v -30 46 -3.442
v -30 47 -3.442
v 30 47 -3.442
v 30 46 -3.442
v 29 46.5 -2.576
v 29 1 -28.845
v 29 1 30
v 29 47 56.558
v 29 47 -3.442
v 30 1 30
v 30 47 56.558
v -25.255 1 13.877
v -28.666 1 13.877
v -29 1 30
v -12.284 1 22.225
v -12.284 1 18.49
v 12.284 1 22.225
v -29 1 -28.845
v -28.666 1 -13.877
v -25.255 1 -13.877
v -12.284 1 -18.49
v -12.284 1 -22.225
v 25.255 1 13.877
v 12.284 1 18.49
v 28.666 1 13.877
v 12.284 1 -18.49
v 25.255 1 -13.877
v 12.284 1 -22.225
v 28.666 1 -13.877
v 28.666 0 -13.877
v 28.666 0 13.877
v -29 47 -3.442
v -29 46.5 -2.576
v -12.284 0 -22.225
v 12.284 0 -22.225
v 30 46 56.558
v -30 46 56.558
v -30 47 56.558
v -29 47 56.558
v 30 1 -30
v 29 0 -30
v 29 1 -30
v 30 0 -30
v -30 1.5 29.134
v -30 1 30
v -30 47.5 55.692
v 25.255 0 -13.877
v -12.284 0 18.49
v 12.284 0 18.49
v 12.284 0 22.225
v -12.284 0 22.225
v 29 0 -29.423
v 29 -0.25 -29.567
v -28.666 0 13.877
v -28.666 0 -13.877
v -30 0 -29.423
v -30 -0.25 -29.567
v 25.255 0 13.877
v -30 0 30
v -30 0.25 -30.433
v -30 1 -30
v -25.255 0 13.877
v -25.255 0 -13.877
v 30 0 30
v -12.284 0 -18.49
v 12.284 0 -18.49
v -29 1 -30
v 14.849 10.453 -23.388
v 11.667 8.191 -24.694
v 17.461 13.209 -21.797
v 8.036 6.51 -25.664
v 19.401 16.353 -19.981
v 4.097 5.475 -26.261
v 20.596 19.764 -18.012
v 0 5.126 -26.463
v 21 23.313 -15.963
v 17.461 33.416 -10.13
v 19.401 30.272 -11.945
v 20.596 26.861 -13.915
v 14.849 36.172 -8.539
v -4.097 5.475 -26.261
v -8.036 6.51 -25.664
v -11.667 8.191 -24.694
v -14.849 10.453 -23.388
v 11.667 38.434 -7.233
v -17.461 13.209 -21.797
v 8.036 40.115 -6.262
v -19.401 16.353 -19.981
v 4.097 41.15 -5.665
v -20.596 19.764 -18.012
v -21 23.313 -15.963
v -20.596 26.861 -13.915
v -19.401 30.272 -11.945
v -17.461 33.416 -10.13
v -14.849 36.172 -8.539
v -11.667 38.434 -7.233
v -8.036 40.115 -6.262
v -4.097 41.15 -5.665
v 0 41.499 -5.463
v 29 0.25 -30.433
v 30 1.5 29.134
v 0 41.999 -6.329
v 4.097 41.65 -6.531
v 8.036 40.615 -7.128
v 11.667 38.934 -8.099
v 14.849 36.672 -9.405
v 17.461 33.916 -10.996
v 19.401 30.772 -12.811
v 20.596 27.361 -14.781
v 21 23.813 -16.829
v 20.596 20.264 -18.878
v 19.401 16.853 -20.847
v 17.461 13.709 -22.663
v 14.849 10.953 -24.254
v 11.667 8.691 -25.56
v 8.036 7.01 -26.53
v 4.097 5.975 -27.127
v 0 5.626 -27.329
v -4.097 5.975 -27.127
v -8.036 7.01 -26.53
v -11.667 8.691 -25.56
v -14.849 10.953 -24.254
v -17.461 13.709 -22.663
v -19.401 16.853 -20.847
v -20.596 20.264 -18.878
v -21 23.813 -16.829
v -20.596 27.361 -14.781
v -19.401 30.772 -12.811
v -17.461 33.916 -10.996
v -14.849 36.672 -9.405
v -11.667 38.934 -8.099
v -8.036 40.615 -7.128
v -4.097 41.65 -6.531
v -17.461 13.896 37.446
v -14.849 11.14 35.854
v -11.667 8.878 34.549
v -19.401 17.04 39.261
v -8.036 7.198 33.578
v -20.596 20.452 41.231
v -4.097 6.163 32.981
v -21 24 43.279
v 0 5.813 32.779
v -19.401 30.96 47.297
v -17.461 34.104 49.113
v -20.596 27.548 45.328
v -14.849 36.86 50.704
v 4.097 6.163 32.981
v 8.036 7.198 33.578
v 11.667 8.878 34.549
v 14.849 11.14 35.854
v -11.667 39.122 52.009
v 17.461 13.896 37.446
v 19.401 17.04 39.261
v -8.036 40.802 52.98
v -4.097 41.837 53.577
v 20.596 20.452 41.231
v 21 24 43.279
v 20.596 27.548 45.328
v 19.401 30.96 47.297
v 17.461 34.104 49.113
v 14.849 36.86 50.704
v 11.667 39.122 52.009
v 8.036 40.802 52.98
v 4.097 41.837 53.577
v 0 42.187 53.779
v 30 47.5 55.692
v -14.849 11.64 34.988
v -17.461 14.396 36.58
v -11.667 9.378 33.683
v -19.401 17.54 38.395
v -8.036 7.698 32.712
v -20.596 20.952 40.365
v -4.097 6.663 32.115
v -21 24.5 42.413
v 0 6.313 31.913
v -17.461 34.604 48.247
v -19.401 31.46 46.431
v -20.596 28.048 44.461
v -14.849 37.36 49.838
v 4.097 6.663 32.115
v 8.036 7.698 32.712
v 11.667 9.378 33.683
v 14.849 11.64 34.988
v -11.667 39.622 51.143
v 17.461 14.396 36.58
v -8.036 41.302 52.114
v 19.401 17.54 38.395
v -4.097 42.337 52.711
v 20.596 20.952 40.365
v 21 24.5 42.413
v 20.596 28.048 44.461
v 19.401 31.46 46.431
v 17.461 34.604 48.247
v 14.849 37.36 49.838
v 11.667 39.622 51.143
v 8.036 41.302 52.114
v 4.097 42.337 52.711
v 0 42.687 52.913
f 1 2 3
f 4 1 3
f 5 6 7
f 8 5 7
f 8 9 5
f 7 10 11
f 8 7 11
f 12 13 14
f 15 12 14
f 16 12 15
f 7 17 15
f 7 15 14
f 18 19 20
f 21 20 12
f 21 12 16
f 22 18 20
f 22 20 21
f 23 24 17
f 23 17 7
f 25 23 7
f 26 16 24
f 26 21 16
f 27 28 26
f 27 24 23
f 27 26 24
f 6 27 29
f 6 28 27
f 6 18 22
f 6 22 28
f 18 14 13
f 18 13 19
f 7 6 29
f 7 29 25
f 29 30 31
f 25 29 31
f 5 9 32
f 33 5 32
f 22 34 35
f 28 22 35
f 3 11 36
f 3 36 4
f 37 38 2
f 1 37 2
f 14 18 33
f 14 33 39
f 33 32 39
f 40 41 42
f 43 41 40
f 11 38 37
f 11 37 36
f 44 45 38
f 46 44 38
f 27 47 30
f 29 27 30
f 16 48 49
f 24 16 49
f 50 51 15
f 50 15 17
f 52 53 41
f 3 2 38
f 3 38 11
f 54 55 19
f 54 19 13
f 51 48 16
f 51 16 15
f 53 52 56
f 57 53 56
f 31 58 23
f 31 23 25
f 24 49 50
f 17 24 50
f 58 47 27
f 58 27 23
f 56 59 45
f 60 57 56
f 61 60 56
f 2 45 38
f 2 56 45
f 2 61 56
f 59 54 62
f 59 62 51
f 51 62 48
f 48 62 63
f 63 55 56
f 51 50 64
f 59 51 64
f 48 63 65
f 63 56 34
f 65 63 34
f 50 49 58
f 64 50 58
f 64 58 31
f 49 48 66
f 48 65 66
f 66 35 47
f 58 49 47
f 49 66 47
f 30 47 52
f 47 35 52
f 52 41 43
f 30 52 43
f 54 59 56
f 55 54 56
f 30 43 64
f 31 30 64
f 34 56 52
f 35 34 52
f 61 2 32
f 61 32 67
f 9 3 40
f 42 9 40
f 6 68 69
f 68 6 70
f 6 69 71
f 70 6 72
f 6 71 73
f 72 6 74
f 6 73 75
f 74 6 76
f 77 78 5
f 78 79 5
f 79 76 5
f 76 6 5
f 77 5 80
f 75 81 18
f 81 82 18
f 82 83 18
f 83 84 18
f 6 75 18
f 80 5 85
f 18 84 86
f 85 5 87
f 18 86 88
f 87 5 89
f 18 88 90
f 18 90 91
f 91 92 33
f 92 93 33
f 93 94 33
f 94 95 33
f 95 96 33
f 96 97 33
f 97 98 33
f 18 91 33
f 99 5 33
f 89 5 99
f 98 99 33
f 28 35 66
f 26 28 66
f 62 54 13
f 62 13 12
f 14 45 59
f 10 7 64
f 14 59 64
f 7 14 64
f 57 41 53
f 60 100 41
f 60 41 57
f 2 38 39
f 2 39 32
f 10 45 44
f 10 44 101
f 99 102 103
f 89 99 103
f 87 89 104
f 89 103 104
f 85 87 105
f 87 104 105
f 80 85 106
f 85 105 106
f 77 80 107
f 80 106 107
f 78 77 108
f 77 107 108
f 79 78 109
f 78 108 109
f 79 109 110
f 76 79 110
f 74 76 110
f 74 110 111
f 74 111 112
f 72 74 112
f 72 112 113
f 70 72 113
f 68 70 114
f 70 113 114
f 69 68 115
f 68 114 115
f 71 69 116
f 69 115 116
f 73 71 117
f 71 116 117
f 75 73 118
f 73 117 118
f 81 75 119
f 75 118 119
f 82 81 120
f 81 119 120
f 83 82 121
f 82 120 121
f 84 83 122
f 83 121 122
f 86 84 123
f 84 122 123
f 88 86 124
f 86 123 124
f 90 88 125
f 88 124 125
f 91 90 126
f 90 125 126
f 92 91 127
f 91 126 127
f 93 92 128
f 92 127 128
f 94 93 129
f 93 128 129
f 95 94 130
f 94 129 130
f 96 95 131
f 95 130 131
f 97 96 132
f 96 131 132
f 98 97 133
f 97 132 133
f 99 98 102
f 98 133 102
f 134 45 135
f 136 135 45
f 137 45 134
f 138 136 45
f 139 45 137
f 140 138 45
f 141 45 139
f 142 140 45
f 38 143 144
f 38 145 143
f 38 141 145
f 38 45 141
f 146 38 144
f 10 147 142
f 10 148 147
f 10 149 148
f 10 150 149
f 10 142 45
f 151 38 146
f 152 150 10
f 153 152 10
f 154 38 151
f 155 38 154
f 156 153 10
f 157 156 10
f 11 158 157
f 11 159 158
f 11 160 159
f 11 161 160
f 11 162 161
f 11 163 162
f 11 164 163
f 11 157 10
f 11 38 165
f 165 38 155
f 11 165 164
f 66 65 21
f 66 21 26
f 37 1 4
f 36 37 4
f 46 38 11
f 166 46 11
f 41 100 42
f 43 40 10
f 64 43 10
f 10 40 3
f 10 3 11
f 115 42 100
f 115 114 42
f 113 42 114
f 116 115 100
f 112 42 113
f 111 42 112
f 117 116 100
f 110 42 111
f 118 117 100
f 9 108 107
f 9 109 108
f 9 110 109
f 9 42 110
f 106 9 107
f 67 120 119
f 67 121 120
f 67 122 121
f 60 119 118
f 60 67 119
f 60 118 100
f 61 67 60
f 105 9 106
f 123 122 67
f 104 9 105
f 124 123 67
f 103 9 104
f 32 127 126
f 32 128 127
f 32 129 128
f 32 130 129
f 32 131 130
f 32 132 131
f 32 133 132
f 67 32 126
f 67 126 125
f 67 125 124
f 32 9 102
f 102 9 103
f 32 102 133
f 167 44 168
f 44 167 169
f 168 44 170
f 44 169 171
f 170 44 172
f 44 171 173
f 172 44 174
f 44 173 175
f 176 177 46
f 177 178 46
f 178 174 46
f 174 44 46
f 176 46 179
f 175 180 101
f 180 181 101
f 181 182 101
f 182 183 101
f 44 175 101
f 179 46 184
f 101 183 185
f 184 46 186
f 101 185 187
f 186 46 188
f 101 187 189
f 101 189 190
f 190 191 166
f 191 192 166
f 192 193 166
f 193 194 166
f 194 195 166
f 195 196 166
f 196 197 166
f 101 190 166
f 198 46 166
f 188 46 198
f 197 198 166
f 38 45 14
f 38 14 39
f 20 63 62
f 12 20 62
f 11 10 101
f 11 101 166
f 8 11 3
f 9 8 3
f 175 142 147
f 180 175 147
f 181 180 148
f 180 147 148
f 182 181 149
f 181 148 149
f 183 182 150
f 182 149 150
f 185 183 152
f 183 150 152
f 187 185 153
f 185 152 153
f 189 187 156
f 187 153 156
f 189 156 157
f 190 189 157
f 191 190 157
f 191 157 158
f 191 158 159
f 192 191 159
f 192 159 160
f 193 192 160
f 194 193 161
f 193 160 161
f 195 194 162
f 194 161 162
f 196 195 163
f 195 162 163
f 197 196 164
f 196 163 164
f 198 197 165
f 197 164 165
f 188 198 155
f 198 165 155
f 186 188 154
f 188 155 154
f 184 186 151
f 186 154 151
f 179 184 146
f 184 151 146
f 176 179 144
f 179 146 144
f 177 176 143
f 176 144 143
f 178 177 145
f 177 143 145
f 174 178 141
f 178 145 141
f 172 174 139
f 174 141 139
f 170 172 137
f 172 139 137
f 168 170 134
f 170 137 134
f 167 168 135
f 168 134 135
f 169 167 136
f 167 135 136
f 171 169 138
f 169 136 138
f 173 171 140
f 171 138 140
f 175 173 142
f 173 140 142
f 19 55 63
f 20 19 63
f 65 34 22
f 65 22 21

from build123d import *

# Parameters (mm, degrees)
SKETCH1_W           = 60
SKETCH1_H           = 60
BOSS_EXTRUDE1_DEPTH = 1
BOSS_EXTRUDE2_DEPTH = 1
BOSS_EXTRUDE3_DEPTH = 1
SKETCH5_W           = 59
SKETCH5_H           = 53.982250169
BOSS_EXTRUDE4_DEPTH = 1
SKETCH6_W           = 24.567934446
SKETCH6_H           = 3.734541331
SKETCH6_W_2         = 3.411160388
SKETCH6_H_2         = 27.754766174
CUT_EXTRUDE2_DEPTH  = 1
SKETCH9_R           = 21
CUT_EXTRUDE3_DEPTH  = 1
SKETCH13_W          = 60
SKETCH13_H          = 53.116224765
BOSS_EXTRUDE6_DEPTH = 1
SKETCH14_R          = 21
CUT_EXTRUDE4_DEPTH  = 1
SKETCH15_W          = 60
SKETCH15_H          = 60
BOSS_EXTRUDE7_DEPTH = 1


with BuildPart() as part:
    # Sketch1 → Boss-Extrude1 (new body)
    with BuildSketch(Plane(origin=(0, 0, 0), x_dir=(1, 0, 0), z_dir=(0, 1, 0))):
        Rectangle(SKETCH1_W, SKETCH1_H)
    extrude(amount=BOSS_EXTRUDE1_DEPTH)

    # Sketch2 → Boss-Extrude2 (add)
    with BuildSketch(Plane.ZY.offset(30)):
        Polygon((-30, 1), (30, 1), (56.558112383, 47), (-3.441887617, 47), align=None)
    extrude(amount=-BOSS_EXTRUDE2_DEPTH)

    # Sketch3 → Boss-Extrude3 (add)
    with BuildSketch(Plane(origin=(30, 0, 0), x_dir=(0, 0, -1), z_dir=(1, 0, 0))):
        Polygon((30, 1), (-30, 1), (-56.558112383, 47), (3.441887617, 47), align=None)
    extrude(amount=-BOSS_EXTRUDE3_DEPTH)

    # Sketch5 → Boss-Extrude4 (add)
    with BuildSketch(Plane(origin=(0, 13.240381057, -22.933012702), x_dir=(-1, 0, 0), z_dir=(0, 0.500000000000001, -0.8660254037844382))):
        with Locations((0.5, 11.991125085)):
            Rectangle(SKETCH5_W, SKETCH5_H)
    extrude(amount=-BOSS_EXTRUDE4_DEPTH)

    # Sketch6 → Cut-Extrude2 (cut)
    with BuildSketch(Plane.XZ):
        with Locations((0, 20.357331474)):
            Rectangle(SKETCH6_W, SKETCH6_H)
        with Locations((0, -20.357331474)):
            Rectangle(SKETCH6_W, SKETCH6_H)
        with Locations((26.960745132, 0)):
            Rectangle(SKETCH6_W_2, SKETCH6_H_2)
        with Locations((-26.960745132, 0)):
            Rectangle(SKETCH6_W_2, SKETCH6_H_2)
    extrude(amount=-CUT_EXTRUDE2_DEPTH, mode=Mode.SUBTRACT)

    # Sketch9 → Cut-Extrude3 (cut)
    with BuildSketch(Plane(origin=(0, 13.240381057, -22.933012702), x_dir=(-1, 0, 0), z_dir=(0, 0.500000000000001, -0.8660254037844382))):
        with Locations(Location((0, 12.207631436, 0), (0, 0, 90))):
            Circle(SKETCH9_R)
    extrude(amount=-CUT_EXTRUDE3_DEPTH, mode=Mode.SUBTRACT)


with BuildPart() as body_2:
    # Sketch13 → Boss-Extrude6 (new body)
    with BuildSketch(Plane(origin=(0, -12.740381057, 22.066987298), x_dir=(1, 0, 0), z_dir=(0, -0.500000000000001, 0.8660254037844382))):
        with Locations((0, 42.424137787)):
            Rectangle(SKETCH13_W, SKETCH13_H)
    extrude(amount=-BOSS_EXTRUDE6_DEPTH)

    # Sketch14 → Cut-Extrude4 (cut)
    with BuildSketch(Plane(origin=(0, -12.740381057, 22.066987298), x_dir=(1, 0, 0), z_dir=(0, -0.500000000000001, 0.8660254037844382))):
        with Locations(Location((0, 42.424137787, 0), (0, 0, 270))):
            Circle(SKETCH14_R)
    extrude(amount=-CUT_EXTRUDE4_DEPTH, mode=Mode.SUBTRACT)


with BuildPart() as body_3:
    # Sketch15 → Boss-Extrude7 (new body)
    with BuildSketch(Plane(origin=(0, 47, 0), x_dir=(1, 0, 0), z_dir=(0, 1, 0))):
        with Locations((0, -26.558112383)):
            Rectangle(SKETCH15_W, SKETCH15_H)
    extrude(amount=-BOSS_EXTRUDE7_DEPTH)


solid = Compound([part.part, body_2.part, body_3.part])
